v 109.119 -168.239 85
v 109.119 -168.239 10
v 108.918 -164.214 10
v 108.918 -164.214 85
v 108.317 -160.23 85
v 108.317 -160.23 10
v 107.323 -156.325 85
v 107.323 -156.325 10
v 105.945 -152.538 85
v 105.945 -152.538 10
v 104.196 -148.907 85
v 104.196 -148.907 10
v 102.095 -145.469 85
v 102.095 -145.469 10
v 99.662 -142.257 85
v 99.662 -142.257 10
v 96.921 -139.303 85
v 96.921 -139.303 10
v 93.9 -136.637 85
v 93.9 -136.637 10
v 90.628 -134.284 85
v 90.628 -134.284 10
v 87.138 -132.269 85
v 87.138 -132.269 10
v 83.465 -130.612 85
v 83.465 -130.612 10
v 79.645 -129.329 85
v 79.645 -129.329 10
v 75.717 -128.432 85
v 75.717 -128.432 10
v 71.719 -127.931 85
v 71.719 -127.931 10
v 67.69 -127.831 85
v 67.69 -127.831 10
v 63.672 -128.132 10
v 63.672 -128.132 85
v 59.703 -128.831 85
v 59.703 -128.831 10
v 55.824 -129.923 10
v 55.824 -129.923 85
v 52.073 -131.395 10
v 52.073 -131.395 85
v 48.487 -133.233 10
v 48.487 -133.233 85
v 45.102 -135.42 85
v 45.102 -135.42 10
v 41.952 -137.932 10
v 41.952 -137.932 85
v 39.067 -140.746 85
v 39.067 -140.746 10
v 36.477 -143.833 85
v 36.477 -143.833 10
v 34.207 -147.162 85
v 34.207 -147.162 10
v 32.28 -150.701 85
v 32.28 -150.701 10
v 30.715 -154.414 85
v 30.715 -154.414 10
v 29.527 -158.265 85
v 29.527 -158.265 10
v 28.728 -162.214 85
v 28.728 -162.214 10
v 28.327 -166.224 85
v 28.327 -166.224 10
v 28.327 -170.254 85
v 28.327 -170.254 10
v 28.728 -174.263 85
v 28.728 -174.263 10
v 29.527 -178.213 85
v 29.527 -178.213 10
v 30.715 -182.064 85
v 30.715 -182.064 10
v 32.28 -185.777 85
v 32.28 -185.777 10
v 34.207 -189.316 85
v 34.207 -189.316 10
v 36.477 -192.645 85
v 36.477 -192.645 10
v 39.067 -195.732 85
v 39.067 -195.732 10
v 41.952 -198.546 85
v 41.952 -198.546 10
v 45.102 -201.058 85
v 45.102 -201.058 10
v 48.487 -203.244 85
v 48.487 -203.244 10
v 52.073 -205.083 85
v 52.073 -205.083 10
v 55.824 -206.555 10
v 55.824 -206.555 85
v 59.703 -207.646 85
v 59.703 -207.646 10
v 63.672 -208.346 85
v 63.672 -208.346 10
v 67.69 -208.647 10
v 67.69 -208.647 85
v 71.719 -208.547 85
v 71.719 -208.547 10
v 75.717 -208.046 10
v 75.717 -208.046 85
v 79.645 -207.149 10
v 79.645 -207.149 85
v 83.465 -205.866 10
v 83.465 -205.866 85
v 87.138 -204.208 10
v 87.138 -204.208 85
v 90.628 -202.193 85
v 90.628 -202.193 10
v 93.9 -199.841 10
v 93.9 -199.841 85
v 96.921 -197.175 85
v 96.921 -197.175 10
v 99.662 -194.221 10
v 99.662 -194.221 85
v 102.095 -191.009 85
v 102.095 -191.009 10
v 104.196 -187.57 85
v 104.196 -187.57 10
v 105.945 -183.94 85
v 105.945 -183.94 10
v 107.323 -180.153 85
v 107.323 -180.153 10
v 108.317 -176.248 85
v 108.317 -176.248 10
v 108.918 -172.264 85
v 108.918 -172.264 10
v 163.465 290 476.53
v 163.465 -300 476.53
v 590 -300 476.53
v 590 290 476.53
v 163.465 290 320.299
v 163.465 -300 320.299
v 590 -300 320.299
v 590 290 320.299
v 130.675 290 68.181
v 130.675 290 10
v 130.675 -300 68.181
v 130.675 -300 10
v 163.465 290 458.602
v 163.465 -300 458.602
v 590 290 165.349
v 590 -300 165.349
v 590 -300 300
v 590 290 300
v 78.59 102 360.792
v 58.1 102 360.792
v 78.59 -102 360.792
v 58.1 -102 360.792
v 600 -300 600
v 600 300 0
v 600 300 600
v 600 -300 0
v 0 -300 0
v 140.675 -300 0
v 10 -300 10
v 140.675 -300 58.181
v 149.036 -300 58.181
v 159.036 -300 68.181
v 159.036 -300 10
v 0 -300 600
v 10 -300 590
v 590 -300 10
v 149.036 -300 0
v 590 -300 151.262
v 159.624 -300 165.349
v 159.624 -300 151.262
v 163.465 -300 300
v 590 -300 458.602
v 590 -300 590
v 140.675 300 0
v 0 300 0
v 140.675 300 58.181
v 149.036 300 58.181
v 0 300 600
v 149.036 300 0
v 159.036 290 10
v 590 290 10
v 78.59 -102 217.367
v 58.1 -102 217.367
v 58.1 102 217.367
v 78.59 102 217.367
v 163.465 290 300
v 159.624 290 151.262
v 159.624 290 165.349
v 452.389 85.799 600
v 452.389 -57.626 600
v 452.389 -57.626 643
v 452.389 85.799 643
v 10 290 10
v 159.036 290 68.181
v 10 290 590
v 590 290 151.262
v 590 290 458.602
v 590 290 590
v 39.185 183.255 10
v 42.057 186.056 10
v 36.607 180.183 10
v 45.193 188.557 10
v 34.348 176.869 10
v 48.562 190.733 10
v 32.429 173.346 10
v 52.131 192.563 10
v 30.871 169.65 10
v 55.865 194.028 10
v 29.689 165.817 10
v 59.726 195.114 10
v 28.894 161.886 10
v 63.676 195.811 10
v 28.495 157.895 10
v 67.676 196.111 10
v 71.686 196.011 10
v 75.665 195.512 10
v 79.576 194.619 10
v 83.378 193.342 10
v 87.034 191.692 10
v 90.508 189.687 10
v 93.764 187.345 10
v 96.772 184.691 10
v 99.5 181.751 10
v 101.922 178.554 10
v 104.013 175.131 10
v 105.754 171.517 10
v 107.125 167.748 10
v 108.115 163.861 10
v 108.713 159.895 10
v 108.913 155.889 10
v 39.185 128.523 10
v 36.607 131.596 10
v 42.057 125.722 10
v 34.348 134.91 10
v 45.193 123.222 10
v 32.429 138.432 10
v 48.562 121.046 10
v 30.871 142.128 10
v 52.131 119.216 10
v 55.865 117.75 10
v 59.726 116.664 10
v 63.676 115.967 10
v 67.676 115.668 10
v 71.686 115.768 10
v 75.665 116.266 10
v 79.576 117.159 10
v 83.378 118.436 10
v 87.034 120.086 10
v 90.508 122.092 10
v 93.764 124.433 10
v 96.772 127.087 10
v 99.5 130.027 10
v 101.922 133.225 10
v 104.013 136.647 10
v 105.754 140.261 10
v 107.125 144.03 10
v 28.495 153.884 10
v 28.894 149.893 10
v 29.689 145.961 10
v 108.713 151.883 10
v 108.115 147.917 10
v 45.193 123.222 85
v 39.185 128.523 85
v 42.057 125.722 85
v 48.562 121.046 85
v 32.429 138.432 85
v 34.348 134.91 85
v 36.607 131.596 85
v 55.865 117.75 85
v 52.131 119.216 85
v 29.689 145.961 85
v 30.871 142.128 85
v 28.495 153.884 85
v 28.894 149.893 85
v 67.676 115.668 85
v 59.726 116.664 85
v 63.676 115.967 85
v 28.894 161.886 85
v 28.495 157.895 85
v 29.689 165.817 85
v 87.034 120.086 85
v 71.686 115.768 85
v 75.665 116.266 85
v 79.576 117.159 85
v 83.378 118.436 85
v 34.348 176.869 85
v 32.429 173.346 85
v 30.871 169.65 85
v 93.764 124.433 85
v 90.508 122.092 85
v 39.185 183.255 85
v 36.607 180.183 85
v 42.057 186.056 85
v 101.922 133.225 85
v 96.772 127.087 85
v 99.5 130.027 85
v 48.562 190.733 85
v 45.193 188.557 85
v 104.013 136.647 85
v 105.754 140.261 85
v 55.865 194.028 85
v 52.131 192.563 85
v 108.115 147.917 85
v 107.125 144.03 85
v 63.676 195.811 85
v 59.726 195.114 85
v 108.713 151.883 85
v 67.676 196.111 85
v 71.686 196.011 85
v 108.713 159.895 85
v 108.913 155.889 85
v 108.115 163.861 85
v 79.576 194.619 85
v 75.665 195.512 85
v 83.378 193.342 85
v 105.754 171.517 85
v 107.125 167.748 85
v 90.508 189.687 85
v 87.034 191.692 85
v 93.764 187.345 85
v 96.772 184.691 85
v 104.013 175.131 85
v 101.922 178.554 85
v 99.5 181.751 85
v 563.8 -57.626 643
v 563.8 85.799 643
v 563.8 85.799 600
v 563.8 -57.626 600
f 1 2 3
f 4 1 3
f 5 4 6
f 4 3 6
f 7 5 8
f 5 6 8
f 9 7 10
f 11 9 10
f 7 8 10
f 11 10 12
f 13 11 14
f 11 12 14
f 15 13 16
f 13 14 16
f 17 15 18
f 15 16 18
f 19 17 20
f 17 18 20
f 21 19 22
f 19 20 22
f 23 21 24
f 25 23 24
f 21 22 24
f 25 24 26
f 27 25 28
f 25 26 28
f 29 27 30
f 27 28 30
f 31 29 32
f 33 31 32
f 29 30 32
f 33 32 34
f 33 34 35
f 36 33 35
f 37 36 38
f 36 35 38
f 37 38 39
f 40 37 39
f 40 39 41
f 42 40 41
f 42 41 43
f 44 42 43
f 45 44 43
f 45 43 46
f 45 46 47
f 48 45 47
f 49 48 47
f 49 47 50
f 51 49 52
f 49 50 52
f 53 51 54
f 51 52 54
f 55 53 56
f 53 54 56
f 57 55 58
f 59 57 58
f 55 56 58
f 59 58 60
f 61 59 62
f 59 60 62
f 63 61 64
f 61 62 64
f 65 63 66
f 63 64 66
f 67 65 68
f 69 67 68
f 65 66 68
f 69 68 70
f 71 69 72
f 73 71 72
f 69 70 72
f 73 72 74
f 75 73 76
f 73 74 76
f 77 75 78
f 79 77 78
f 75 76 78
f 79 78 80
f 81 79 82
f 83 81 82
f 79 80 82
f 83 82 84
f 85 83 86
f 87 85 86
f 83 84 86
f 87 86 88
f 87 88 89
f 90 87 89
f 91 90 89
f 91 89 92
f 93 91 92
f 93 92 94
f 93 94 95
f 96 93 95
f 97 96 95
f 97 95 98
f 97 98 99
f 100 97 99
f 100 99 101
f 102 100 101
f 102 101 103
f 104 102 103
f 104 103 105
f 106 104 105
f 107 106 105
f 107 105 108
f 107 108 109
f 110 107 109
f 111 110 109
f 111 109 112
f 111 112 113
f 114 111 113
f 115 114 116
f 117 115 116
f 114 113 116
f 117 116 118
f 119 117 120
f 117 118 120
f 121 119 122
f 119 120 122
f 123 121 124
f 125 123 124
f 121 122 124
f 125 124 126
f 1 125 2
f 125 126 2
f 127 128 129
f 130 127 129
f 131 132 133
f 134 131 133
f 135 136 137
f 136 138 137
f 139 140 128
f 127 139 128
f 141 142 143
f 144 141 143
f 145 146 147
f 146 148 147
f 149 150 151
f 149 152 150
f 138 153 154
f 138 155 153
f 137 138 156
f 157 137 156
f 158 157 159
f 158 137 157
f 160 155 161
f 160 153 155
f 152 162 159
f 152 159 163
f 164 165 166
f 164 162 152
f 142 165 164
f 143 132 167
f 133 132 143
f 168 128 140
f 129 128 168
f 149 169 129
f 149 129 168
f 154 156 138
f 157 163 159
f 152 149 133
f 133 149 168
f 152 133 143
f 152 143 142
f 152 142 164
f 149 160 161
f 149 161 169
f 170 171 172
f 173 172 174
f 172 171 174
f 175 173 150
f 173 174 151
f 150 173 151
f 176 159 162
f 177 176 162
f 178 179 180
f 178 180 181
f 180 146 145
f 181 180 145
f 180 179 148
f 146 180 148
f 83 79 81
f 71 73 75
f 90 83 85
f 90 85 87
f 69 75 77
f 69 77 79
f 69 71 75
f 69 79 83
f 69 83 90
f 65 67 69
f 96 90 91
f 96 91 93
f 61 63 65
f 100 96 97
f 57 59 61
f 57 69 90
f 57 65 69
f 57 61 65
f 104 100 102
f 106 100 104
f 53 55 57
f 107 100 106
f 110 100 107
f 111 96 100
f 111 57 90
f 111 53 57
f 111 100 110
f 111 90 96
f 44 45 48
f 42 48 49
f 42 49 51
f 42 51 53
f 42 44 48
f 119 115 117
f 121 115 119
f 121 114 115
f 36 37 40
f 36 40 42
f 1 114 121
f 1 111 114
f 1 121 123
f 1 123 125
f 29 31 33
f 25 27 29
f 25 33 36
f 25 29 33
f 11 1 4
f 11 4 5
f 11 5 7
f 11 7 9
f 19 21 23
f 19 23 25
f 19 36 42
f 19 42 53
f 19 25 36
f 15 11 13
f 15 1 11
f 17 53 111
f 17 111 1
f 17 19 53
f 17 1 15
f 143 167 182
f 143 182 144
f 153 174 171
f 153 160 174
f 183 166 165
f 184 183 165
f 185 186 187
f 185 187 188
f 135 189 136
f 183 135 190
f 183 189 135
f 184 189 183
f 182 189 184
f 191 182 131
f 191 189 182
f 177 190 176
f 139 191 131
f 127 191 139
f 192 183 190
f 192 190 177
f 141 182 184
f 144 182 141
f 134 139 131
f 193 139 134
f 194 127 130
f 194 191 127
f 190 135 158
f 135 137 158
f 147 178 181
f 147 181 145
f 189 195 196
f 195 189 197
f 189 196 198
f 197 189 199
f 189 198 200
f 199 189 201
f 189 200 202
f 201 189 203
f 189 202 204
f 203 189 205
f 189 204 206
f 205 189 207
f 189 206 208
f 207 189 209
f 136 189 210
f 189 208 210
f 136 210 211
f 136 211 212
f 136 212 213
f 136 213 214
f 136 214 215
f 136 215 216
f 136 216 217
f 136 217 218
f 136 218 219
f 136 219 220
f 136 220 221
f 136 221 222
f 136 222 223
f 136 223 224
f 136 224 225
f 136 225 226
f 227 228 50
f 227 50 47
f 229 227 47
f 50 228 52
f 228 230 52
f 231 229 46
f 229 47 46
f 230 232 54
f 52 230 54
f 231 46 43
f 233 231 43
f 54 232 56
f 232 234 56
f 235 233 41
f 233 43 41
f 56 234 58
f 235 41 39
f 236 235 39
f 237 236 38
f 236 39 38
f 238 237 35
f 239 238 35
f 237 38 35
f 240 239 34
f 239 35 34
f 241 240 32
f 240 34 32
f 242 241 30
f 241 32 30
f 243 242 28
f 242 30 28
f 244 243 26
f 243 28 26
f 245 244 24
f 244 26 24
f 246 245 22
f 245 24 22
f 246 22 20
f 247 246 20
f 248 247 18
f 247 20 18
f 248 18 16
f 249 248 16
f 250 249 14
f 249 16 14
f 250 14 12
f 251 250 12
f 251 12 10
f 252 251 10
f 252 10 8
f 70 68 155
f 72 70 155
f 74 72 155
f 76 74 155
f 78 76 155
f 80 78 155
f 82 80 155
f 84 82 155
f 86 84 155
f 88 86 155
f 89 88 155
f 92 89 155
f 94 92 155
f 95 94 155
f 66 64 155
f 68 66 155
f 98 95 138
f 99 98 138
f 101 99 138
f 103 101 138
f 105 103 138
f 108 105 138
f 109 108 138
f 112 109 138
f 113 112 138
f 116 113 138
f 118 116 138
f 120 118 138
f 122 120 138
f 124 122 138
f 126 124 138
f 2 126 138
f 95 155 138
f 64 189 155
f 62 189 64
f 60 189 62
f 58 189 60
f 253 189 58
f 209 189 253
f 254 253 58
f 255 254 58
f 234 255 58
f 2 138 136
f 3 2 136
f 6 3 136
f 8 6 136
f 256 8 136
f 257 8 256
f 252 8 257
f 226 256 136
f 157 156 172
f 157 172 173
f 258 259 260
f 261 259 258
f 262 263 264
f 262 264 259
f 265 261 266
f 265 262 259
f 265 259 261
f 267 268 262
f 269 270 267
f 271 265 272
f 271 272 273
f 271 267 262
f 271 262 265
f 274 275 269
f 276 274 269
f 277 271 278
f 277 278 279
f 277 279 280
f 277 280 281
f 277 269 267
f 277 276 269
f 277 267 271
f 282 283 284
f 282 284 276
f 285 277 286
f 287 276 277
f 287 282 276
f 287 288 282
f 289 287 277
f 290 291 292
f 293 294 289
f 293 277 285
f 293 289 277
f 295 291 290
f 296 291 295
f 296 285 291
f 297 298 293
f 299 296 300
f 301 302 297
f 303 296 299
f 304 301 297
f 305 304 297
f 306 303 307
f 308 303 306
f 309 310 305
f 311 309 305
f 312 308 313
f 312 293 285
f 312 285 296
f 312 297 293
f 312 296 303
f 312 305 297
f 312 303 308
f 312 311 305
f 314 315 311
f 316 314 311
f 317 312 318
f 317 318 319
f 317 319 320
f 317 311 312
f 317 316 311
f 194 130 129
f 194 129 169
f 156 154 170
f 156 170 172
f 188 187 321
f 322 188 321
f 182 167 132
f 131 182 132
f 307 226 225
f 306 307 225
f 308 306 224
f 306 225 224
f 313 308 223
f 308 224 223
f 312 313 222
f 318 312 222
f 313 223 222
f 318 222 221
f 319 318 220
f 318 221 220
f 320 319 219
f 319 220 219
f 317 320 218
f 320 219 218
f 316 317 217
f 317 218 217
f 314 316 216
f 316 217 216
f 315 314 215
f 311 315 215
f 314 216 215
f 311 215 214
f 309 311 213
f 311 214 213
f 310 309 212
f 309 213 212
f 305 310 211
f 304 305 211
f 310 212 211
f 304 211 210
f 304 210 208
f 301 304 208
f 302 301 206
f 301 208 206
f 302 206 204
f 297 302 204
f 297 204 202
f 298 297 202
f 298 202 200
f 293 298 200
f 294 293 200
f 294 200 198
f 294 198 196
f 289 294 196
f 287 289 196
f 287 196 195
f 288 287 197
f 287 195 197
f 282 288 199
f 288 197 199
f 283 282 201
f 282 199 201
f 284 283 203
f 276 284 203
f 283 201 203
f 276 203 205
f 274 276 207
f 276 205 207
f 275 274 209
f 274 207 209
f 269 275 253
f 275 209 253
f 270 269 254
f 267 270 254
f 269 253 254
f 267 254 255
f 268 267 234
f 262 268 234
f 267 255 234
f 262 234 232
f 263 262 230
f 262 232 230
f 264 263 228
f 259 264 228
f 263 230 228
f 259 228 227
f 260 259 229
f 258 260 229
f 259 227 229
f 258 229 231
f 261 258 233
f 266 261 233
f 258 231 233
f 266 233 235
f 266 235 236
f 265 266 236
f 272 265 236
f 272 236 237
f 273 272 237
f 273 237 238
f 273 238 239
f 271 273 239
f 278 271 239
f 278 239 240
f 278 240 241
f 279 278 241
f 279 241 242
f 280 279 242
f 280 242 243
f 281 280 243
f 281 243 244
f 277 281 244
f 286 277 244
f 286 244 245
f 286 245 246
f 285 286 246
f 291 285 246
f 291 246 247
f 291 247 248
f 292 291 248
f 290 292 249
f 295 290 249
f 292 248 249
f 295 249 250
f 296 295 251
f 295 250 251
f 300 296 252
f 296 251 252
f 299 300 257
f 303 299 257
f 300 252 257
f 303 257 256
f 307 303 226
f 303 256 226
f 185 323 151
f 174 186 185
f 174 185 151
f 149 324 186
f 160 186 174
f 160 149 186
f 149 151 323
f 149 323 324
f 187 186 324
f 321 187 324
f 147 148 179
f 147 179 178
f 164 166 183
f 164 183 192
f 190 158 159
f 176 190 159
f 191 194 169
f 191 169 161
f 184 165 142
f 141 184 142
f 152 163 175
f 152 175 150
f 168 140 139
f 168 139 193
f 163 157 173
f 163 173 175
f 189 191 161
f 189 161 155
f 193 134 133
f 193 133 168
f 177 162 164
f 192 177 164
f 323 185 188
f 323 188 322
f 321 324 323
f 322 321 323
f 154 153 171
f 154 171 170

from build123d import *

# Parameters (mm, degrees)
F1_DEPTH  = 300
F2_T      = -10
F3_R      = 40.4208706322
F3_R_2    = 40.2339451726
F4_DEPTH  = 75
F5_W      = 426.5346491337
F5_H      = 17.9281830788
F5_H_2    = 20.2991783619
F5_W_2    = 430.3763920069
F5_H_3    = 14.0864104033
F6_DEPTH  = 590
F7_W      = 20.4893276095
F7_H      = 143.4252560139
F8_DEPTH  = 102
F9_W      = 111.4106178284
F9_H      = 143.425244838
F10_DEPTH = 43


with BuildPart() as f1:
    # F0 (on Front) → F1 (new body, symmetric)
    with BuildSketch(Plane.XZ):
        Polygon((0, 600), (0, 0), (140.6750679016, 0), (140.6750679016, 58.1811070442), (149.0360796452, 58.1811070442), (149.0360796452, 0), (600, 0), (600, 600), align=None)
    extrude(amount=F1_DEPTH, both=True)

    # F2
    f2_openings = [f1.faces().sort_by_distance(p)[0] for p in [
        (300.209924, -300, 300.366564),
    ]]
    offset(amount=F2_T, openings=f2_openings, kind=Kind.INTERSECTION)

    # F3 (on face) → F4 (join)
    with BuildSketch(Plane.XY.offset(10)):
        with Locations((68.6978474259, -168.2388931513)):
            Circle(F3_R)
        with Locations((68.6788782477, 155.8891236782)):
            Circle(F3_R_2)
    extrude(amount=F4_DEPTH)

    # F5 (on face) → F6 (join, through all)
    with BuildSketch(Plane.XZ.offset(300)):
        with Locations((376.7326754332, 467.5661623478)):
            Rectangle(F5_W, F5_H)
        with Locations((376.7326754332, 310.1495891809)):
            Rectangle(F5_W, F5_H_2)
        with Locations((374.8118039966, 158.3054736257)):
            Rectangle(F5_W_2, F5_H_3)
    extrude(amount=-F6_DEPTH)

    # F9 (on face) → F10 (join)
    with BuildSketch(Plane.XY.offset(600)):
        with Locations((508.0946683884, 14.0863787383)):
            Rectangle(F9_W, F9_H)
    extrude(amount=F10_DEPTH)


with BuildPart() as f8:
    # F7 (on Front) → F8 (new body, symmetric)
    with BuildSketch(Plane.XZ):
        with Locations((68.3449544013, 289.0791445971)):
            Rectangle(F7_W, F7_H)
    extrude(amount=F8_DEPTH, both=True)


solid = Compound([f1.part, f8.part])
